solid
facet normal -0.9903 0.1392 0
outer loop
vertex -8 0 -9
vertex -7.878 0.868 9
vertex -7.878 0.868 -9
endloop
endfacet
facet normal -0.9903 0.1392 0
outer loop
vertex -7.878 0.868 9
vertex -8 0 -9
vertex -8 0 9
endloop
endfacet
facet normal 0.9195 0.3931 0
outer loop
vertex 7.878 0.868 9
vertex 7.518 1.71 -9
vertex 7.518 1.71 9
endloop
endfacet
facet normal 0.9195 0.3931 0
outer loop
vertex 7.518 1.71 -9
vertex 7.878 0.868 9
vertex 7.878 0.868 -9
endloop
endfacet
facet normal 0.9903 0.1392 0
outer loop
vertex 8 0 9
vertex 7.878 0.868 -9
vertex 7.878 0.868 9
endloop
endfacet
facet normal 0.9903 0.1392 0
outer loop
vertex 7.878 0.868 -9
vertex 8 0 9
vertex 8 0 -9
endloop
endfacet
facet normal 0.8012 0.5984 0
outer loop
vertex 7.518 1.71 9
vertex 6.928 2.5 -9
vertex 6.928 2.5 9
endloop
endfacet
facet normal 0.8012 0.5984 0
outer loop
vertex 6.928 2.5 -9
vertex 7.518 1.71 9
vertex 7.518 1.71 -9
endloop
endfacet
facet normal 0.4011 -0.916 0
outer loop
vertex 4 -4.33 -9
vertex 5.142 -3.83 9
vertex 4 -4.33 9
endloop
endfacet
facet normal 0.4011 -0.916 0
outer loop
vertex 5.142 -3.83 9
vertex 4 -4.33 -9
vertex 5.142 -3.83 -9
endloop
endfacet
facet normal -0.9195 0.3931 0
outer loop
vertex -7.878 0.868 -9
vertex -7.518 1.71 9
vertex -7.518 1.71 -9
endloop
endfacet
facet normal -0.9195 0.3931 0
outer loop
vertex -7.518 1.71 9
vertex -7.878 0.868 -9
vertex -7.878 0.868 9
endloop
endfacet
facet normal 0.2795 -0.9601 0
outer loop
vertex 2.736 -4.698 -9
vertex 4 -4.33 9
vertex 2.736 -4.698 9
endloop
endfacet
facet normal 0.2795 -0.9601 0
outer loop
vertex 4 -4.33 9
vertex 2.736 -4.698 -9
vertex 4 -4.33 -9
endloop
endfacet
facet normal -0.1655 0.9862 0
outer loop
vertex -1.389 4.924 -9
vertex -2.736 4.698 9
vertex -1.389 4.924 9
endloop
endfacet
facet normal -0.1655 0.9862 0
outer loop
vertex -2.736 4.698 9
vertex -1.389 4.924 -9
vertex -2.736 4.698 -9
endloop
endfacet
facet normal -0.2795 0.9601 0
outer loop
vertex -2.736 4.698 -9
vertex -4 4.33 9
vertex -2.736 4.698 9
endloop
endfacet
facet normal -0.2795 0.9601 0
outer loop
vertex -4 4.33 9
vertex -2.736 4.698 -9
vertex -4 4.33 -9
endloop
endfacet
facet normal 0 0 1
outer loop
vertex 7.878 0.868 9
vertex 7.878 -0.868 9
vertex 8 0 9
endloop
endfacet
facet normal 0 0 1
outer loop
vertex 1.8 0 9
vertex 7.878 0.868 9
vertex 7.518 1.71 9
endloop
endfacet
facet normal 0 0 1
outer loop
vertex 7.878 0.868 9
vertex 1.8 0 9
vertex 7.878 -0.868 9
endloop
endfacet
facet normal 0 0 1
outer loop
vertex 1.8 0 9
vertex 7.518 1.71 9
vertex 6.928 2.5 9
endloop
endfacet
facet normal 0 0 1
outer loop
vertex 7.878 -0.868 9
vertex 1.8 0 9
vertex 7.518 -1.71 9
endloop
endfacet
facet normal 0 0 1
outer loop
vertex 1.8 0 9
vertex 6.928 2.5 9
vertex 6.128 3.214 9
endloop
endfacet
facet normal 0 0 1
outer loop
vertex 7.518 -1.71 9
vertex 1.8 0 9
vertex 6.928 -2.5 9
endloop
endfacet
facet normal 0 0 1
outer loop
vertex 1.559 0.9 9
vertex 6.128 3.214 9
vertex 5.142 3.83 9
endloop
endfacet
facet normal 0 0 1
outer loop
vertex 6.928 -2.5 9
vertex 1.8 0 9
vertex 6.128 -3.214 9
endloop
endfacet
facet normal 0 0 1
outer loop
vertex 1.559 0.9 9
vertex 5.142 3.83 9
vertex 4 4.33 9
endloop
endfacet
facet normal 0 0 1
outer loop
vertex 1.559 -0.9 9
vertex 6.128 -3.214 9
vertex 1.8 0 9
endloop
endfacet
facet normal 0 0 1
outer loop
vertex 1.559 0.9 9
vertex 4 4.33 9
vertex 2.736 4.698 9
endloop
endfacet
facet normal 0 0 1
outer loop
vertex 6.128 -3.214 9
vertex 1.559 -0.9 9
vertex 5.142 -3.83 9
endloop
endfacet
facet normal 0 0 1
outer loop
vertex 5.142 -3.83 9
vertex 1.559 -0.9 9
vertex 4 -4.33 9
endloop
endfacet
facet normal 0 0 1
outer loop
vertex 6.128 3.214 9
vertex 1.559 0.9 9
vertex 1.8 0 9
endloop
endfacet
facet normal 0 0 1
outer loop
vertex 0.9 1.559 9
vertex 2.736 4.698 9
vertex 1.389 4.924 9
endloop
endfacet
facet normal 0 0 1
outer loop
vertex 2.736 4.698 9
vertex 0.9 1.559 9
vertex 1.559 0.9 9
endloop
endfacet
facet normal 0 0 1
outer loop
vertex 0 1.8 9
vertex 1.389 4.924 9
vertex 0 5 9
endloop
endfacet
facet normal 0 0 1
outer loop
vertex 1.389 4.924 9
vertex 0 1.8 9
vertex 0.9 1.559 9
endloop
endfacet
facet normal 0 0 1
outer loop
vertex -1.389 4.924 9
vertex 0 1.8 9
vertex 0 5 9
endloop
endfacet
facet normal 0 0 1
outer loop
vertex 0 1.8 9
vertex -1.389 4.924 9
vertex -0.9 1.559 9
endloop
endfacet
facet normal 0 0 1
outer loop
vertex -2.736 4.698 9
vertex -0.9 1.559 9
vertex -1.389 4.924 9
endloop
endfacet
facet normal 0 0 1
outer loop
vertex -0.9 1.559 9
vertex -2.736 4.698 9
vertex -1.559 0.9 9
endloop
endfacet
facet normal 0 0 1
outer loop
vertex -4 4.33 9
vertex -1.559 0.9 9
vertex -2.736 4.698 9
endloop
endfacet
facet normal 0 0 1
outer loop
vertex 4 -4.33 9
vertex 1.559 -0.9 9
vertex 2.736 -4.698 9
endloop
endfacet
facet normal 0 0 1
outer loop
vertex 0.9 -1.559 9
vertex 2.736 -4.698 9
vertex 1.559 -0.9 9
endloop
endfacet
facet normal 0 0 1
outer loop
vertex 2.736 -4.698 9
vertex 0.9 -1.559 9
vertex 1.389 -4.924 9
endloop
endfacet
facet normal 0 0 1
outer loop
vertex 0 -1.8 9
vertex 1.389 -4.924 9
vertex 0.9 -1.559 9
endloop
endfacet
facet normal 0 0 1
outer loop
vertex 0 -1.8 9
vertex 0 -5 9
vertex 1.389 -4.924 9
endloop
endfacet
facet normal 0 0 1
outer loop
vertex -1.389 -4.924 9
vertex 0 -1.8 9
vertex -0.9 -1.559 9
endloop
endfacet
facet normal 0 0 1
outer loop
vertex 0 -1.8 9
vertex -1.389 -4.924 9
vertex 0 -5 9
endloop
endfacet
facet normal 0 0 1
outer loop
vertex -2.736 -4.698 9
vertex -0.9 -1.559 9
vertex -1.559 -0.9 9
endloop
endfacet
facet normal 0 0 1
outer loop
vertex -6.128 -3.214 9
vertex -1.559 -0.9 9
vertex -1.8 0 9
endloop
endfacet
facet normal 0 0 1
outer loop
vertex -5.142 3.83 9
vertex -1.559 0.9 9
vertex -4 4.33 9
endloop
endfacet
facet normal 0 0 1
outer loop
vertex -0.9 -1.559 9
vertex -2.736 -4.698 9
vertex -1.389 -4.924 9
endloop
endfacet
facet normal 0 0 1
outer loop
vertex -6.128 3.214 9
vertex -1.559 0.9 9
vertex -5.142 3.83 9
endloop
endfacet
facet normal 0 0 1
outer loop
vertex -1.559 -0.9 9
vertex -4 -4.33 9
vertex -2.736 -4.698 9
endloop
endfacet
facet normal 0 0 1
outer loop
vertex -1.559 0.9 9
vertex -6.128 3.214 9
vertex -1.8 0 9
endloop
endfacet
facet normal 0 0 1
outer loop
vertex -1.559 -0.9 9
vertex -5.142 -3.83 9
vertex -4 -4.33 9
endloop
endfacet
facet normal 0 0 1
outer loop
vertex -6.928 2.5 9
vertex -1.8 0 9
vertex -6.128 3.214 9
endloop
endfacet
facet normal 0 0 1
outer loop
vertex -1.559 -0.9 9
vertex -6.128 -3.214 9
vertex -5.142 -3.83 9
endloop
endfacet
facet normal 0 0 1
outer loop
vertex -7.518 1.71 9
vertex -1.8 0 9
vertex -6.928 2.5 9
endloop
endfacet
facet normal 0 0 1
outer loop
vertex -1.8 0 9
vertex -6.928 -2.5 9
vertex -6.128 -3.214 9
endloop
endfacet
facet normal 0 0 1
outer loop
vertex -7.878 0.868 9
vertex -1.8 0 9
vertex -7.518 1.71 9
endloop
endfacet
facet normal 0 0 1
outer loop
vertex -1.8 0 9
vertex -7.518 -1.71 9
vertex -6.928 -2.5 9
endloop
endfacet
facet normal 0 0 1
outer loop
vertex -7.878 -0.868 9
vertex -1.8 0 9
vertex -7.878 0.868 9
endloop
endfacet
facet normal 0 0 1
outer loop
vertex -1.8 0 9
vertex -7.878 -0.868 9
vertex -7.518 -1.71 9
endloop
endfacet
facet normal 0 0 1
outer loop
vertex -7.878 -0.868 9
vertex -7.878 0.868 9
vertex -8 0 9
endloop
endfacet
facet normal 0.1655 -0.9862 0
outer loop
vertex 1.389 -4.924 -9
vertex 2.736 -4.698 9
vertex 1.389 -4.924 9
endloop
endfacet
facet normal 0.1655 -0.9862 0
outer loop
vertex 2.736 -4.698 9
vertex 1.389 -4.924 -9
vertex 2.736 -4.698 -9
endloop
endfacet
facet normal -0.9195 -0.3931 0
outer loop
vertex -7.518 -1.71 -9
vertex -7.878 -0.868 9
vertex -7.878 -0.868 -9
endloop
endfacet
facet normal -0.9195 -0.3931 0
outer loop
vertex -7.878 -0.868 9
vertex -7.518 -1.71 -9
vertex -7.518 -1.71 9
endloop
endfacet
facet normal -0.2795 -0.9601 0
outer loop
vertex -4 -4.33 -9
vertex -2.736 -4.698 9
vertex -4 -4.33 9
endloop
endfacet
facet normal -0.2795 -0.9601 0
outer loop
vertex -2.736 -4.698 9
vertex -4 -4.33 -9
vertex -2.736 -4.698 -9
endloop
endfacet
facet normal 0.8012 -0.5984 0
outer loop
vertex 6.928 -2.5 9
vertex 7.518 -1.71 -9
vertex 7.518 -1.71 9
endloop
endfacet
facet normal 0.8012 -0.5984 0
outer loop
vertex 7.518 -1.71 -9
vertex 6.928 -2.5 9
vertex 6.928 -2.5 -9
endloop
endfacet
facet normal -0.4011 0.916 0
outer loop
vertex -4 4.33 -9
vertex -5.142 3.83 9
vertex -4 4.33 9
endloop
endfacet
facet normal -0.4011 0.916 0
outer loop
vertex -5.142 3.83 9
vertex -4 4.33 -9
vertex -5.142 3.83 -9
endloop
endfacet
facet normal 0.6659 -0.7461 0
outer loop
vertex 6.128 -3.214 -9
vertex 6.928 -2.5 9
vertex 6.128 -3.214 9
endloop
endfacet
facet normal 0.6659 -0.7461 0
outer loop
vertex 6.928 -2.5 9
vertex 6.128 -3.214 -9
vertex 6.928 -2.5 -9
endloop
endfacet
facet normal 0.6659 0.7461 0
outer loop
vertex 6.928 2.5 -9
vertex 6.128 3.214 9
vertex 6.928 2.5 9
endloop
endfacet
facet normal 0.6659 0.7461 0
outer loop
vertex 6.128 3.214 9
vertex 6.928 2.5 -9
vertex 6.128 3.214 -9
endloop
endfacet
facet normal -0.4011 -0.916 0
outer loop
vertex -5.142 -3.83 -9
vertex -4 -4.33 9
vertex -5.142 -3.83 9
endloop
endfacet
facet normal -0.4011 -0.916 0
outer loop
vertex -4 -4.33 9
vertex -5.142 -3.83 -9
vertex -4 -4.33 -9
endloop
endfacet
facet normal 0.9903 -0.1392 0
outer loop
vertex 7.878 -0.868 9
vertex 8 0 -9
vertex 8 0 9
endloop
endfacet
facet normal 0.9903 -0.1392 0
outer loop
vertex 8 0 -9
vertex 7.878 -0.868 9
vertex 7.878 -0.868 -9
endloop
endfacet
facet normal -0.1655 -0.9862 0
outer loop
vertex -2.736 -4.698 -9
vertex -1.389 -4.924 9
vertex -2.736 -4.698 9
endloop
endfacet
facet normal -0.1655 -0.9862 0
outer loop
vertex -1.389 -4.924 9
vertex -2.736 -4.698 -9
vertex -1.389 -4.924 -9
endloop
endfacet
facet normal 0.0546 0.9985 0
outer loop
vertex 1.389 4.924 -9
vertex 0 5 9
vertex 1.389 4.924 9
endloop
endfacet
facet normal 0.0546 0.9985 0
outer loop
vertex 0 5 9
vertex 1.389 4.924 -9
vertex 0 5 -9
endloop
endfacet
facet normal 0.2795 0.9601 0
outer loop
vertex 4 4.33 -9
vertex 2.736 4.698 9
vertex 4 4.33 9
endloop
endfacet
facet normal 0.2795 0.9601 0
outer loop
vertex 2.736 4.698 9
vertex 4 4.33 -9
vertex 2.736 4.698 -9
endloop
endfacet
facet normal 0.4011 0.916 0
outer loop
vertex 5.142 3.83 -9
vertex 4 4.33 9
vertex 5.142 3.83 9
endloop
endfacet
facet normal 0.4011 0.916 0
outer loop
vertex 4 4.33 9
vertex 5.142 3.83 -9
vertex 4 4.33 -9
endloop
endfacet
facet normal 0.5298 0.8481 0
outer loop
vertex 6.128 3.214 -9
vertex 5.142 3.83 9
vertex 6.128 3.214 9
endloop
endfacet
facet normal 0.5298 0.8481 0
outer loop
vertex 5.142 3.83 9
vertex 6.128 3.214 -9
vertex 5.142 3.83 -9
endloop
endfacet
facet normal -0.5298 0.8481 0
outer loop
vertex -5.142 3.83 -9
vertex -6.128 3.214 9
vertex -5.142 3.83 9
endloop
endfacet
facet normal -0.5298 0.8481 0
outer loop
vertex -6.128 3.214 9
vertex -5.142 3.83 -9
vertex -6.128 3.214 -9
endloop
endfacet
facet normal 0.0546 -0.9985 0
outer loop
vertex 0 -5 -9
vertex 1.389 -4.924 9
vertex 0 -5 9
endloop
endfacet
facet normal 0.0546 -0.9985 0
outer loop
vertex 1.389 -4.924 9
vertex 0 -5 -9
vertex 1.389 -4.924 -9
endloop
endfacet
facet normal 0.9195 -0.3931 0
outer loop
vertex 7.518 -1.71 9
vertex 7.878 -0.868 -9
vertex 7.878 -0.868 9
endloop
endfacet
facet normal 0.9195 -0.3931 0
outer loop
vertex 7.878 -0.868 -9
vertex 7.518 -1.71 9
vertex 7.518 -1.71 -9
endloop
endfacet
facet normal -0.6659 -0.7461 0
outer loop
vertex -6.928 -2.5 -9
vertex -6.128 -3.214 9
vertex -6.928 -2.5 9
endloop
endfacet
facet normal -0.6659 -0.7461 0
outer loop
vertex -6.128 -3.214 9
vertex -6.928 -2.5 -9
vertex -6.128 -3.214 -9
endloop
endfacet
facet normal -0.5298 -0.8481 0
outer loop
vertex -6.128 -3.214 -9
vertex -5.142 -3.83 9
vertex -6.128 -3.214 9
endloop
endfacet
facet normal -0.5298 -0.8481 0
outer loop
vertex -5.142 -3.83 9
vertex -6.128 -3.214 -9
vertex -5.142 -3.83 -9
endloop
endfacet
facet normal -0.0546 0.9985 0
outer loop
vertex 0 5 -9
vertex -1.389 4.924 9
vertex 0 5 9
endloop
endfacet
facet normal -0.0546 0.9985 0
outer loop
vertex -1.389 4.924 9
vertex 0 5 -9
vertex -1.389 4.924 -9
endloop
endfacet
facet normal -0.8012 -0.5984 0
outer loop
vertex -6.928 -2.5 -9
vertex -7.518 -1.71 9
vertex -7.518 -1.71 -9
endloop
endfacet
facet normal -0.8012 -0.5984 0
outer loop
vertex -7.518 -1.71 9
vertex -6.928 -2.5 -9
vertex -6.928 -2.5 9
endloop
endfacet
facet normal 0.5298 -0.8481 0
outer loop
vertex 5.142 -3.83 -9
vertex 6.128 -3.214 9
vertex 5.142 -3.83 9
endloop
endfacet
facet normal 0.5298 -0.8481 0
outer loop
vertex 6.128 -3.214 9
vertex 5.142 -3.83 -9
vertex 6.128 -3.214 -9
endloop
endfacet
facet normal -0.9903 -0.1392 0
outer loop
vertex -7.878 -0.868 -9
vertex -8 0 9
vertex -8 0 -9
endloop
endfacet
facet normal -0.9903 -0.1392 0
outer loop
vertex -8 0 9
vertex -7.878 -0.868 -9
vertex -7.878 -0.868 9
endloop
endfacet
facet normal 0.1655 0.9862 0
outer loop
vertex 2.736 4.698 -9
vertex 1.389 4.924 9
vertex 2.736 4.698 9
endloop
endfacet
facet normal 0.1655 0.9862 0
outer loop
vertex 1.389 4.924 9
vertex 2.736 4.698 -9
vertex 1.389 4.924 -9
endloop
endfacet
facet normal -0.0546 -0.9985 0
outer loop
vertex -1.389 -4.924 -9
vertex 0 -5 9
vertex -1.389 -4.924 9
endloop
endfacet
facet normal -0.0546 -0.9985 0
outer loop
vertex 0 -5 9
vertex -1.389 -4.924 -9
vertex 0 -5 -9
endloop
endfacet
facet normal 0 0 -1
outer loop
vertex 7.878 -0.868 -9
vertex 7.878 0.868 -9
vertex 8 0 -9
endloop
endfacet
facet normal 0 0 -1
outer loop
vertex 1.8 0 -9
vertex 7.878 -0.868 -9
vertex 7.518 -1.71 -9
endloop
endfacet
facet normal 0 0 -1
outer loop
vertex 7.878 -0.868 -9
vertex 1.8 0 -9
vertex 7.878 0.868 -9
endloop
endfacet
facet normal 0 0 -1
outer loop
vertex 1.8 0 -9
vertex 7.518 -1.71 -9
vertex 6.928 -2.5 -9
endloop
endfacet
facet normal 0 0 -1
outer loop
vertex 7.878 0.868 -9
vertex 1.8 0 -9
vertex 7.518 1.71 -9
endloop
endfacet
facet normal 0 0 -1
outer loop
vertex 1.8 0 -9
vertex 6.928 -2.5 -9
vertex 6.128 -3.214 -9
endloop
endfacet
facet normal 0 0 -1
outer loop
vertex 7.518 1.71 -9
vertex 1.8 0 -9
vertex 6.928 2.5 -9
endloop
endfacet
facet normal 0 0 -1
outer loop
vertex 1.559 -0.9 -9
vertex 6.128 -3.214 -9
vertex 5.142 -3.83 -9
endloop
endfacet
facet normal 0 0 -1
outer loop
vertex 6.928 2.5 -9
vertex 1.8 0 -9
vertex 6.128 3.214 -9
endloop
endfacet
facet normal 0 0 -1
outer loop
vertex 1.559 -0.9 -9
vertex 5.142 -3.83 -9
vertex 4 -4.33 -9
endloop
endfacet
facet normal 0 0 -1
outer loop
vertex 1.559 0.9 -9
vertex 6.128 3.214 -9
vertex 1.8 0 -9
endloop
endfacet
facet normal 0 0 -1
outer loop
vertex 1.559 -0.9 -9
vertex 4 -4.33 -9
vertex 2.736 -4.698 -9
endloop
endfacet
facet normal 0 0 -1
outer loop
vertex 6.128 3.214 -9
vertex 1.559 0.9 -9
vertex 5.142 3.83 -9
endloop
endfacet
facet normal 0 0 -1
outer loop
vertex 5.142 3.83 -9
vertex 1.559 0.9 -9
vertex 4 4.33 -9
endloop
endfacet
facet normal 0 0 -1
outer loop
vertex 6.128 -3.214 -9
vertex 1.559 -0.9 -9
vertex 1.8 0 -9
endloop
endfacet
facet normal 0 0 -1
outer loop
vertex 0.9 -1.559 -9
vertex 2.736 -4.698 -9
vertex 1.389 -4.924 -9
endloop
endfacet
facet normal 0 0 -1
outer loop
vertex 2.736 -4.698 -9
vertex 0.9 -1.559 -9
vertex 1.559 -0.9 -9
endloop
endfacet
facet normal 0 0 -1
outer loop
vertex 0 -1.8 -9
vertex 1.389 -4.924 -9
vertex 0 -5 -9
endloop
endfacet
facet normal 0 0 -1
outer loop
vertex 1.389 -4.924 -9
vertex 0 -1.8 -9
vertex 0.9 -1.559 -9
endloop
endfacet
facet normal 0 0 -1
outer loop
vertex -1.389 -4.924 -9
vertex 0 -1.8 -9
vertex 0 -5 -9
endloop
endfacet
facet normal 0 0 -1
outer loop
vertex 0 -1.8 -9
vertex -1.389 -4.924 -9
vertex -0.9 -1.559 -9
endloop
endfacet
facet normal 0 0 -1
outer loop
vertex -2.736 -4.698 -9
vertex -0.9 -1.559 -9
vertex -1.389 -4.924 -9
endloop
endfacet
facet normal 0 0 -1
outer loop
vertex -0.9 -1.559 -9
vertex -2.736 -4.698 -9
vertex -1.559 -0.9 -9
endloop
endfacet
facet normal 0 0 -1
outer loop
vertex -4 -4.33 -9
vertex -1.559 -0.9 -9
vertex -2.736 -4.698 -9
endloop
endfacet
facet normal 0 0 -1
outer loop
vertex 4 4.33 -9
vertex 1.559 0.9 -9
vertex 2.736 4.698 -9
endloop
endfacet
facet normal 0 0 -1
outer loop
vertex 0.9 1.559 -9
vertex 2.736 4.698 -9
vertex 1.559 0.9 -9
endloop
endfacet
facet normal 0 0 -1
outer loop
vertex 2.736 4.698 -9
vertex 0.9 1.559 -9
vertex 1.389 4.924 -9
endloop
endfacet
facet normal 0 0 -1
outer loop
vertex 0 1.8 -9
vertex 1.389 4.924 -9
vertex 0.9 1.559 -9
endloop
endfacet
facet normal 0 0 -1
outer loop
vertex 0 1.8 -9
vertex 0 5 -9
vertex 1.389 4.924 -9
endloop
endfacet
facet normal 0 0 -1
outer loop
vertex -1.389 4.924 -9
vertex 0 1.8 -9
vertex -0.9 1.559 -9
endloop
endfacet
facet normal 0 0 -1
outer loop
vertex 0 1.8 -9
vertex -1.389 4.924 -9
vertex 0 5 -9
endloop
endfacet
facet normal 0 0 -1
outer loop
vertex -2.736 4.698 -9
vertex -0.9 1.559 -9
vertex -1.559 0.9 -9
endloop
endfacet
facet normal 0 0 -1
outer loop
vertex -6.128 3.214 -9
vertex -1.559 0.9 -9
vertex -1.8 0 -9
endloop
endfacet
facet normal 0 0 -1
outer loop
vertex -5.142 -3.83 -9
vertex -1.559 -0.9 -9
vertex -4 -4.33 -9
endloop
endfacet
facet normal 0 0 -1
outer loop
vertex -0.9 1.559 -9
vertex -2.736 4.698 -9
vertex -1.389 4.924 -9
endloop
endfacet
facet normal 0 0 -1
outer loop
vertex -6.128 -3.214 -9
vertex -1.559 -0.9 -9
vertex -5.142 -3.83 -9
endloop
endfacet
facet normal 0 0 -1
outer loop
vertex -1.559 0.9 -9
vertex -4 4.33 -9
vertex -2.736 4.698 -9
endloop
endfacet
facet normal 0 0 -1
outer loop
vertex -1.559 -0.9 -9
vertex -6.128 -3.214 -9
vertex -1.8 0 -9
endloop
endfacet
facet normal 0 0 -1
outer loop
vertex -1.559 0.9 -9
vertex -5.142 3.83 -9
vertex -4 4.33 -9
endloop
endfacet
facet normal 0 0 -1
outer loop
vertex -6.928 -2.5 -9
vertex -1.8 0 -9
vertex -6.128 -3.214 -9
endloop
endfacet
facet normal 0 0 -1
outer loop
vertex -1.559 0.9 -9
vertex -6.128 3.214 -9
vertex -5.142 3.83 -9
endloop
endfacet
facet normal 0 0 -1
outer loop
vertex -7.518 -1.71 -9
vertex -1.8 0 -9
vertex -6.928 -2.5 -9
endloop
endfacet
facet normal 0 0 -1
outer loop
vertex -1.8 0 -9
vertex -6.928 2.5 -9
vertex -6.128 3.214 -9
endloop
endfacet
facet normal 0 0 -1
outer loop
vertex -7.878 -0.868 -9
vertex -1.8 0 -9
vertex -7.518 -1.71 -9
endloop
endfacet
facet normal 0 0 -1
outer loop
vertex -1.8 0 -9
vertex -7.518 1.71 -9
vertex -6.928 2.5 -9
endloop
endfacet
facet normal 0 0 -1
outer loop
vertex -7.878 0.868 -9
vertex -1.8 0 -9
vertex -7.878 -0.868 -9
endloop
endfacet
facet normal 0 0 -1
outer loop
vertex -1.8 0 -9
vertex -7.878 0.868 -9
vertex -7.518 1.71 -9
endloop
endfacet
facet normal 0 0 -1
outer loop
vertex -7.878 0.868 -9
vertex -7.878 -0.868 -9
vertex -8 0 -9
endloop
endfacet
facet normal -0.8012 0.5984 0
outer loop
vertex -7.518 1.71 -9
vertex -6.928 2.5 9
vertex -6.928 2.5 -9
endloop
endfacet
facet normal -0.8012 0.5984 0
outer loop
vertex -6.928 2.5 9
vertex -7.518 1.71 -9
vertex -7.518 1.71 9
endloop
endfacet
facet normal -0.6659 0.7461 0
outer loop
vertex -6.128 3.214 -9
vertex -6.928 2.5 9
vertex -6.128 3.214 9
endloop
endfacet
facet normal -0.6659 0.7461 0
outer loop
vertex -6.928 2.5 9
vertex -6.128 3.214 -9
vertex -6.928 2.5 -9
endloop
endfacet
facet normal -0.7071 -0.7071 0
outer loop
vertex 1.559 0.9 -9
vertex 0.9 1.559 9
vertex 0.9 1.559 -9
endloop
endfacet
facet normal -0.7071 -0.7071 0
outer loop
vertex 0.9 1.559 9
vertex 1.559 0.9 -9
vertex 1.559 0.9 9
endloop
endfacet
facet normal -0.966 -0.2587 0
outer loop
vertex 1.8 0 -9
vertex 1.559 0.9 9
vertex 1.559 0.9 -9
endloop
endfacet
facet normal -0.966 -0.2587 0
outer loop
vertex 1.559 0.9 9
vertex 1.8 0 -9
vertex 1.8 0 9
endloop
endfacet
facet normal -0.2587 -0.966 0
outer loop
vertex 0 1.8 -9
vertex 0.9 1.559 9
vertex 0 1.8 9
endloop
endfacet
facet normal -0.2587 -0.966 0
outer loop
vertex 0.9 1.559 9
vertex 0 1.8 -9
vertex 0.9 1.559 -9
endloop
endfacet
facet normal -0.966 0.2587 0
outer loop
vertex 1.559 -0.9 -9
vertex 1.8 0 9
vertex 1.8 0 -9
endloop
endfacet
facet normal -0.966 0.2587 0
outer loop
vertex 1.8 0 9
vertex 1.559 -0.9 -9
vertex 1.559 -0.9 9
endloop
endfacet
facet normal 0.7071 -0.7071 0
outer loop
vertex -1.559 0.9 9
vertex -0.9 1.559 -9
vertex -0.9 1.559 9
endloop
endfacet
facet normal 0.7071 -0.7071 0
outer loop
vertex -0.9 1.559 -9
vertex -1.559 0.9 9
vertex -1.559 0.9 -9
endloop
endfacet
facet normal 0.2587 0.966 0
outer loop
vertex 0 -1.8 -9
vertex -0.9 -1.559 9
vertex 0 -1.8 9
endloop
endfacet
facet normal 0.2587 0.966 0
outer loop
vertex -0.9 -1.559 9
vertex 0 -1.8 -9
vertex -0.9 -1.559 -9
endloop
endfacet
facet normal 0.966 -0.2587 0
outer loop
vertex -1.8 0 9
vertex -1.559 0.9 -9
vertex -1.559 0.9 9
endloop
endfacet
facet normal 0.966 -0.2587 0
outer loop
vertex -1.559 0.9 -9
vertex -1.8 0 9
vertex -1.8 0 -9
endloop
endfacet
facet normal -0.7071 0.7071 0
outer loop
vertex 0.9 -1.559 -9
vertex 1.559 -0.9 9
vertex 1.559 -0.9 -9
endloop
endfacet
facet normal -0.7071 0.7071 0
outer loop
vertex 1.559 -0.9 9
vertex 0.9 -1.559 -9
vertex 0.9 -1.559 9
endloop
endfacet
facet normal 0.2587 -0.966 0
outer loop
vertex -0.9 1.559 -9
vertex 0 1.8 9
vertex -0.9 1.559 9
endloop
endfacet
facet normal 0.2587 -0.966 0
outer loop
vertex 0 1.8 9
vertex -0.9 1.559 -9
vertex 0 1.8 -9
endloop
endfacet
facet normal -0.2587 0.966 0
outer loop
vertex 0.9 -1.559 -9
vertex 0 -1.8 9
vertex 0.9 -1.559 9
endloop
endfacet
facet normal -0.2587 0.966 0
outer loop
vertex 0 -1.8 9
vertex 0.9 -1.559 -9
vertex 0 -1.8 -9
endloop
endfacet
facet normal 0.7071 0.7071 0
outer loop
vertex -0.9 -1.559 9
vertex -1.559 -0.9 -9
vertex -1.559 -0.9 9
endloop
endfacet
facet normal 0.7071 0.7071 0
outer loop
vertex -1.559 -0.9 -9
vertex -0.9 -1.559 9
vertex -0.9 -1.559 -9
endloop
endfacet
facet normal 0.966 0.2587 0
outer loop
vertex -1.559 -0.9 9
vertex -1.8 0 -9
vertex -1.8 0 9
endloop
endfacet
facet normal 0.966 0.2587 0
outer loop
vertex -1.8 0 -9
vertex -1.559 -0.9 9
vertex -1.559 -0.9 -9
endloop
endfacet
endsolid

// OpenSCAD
difference() {
  scale([1.6, 1, 1]) cylinder(r=5, h=18, center=true, $fn=36);
  cylinder(r=1.8, h=20, center=true, $fn=12);
}
